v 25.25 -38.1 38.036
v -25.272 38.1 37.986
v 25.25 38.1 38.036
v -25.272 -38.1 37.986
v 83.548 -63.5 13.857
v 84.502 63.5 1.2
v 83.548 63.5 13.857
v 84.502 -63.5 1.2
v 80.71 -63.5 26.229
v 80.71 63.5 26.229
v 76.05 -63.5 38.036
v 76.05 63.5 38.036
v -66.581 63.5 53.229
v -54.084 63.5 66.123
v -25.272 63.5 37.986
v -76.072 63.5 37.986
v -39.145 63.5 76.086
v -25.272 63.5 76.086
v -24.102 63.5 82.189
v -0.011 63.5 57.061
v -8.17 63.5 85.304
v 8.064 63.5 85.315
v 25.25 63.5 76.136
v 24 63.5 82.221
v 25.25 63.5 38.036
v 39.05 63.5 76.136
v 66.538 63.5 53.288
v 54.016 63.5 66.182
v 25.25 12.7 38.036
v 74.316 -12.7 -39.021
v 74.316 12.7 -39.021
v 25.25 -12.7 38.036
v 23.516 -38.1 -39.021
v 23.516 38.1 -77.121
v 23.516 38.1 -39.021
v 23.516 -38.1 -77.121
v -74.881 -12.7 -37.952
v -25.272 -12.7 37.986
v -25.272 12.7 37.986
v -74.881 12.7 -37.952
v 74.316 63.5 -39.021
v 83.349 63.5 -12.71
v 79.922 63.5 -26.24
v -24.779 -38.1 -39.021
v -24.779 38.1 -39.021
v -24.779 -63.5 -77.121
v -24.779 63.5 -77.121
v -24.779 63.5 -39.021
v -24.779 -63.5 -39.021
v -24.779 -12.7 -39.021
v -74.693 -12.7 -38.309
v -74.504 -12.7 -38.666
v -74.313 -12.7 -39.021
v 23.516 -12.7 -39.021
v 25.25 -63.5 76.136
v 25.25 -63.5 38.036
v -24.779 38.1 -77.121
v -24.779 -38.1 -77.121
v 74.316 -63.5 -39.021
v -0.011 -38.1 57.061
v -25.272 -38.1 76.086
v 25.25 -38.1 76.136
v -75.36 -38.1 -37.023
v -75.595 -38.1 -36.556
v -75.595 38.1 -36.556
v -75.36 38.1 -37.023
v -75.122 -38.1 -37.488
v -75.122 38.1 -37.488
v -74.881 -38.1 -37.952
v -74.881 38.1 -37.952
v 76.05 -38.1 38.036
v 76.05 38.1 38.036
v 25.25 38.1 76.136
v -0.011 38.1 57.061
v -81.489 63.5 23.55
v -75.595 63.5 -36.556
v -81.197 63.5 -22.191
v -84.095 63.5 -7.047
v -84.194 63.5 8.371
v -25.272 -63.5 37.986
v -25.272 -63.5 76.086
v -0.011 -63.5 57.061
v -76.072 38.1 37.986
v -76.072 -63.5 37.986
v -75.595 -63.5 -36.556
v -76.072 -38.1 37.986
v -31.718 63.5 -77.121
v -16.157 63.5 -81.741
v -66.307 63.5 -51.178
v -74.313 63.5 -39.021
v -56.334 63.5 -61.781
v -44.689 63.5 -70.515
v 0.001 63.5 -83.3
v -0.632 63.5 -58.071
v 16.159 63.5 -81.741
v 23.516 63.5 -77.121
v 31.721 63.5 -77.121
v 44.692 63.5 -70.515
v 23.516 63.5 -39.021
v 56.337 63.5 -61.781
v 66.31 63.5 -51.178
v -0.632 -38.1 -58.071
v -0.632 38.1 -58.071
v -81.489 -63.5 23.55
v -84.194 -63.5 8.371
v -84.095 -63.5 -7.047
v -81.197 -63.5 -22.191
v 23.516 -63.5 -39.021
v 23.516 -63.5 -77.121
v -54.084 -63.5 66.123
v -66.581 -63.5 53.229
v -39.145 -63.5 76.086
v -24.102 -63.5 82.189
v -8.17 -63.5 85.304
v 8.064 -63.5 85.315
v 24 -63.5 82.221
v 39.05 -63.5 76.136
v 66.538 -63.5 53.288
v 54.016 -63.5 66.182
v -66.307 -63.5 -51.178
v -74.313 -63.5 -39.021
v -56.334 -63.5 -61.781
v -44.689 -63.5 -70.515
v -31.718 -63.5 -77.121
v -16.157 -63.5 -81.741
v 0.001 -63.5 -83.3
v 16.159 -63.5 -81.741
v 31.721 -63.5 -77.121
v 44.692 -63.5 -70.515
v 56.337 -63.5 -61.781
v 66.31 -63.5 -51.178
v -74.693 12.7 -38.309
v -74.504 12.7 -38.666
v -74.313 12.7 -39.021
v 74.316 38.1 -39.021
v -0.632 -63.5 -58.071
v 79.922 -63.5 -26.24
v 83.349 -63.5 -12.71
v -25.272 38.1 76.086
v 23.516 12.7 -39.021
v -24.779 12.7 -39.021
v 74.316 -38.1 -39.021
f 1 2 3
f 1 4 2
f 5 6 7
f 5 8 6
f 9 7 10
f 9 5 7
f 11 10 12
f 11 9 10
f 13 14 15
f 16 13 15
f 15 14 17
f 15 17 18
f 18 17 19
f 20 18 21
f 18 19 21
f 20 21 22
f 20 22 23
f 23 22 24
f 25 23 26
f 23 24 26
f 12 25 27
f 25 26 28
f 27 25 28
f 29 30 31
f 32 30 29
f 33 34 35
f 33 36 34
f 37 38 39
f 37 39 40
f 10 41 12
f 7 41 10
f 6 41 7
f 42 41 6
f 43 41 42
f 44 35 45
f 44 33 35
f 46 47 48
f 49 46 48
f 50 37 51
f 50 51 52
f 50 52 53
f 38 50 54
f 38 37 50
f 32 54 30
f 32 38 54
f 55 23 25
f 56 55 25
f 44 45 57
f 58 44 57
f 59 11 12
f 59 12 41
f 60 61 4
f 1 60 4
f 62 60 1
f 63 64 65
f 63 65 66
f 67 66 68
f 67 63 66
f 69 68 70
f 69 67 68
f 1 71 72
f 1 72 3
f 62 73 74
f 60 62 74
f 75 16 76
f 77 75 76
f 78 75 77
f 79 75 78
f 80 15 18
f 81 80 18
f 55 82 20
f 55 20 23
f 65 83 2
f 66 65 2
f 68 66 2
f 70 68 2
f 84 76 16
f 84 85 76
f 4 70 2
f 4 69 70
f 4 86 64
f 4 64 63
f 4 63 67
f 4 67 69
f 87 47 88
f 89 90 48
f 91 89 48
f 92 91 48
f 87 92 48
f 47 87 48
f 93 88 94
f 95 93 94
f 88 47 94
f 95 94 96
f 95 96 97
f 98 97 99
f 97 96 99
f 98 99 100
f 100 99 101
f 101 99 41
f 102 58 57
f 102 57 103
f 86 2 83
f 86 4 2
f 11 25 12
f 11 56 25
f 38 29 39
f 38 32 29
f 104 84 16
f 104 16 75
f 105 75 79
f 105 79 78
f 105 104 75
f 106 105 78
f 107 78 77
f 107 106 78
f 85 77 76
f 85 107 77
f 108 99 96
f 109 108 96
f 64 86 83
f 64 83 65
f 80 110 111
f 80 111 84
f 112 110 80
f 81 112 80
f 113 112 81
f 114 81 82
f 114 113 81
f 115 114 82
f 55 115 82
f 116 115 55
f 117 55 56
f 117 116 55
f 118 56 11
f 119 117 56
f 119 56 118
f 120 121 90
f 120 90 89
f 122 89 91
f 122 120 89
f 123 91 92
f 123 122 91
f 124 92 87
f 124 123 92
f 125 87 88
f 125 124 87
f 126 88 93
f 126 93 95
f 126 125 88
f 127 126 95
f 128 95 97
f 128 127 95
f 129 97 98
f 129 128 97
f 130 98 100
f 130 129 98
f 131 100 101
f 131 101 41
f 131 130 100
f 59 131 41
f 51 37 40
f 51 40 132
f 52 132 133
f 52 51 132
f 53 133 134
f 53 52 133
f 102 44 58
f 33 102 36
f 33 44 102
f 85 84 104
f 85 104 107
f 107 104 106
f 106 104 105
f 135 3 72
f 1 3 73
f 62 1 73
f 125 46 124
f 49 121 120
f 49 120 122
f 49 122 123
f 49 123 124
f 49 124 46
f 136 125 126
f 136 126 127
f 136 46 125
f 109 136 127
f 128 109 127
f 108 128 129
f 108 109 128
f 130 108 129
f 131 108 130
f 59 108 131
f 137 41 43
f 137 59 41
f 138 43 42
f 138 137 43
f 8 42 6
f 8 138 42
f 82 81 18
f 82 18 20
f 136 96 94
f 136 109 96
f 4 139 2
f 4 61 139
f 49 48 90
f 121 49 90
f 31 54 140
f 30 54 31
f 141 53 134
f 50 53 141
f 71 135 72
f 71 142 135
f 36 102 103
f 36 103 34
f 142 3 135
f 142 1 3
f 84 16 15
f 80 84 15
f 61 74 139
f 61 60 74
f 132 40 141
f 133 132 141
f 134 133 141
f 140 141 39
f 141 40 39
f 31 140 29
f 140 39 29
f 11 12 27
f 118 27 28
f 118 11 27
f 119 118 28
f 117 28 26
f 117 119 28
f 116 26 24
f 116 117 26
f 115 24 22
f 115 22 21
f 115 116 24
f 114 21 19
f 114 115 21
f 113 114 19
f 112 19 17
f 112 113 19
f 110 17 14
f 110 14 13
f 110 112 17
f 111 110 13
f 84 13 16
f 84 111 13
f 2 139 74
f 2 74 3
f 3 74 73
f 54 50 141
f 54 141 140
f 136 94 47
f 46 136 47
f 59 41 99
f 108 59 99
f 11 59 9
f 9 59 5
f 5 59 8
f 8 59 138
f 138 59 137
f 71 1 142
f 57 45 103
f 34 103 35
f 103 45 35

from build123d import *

# Parameters (mm, degrees)
F1_DEPTH = 63.5
F2_DEPTH = 12.7
F3_DEPTH = 38.1


with BuildPart() as f1:
    # F0 (on Front) → F1 (new body, symmetric)
    with BuildSketch(Plane.XZ):
        with BuildLine():
            ThreePointArc((84.5017363775, 1.1998772249), (82.3616896747, 20.0966814365), (76.0499468625, 38.0363278091))
            Line((76.0499468625, 38.0363278091), (74.3155075788, -39.0209970117))
            ThreePointArc((74.3155075788, -39.0209970117), (81.9156048852, -19.5454715399), (84.5017363775, 1.1998772249))
        make_face()
    extrude(amount=F1_DEPTH, both=True)


with BuildPart() as f1b:
    # F0 (on Front) → F1, piece 2 (new body, symmetric)
    with BuildSketch(Plane.XZ):
        with BuildLine():
            ThreePointArc((76.0499468625, 38.0363278091), (60.6212581563, 60.0686808362), (39.0504506642, 76.1363278091))
            Line((39.0504506642, 76.1363278091), (25.2499468625, 76.1363278091))
            Line((25.2499468625, 76.1363278091), (25.2499468625, 38.0363278091))
            Line((25.2499468625, 38.0363278091), (76.0499468625, 38.0363278091))
        make_face()
        with BuildLine():
            Line((25.2499468625, 76.1363278091), (39.0504506642, 76.1363278091))
            ThreePointArc((39.0504506642, 76.1363278091), (-0.0532737034, 85.7001203567), (-39.1445721419, 76.085663861))
            Line((-39.1445721419, 76.085663861), (-25.2715156794, 76.085663861))
            Line((-25.2715156794, 76.085663861), (-0.0107844085, 57.0609958351))
            Line((-0.0107844085, 57.0609958351), (25.2499468625, 76.1363278091))
        make_face()
        with BuildLine():
            Line((-25.2715156794, 76.085663861), (-39.1445721419, 76.085663861))
            ThreePointArc((-39.1445721419, 76.085663861), (-60.6760263163, 60.0091865137), (-76.0715156794, 37.985663861))
            Line((-76.0715156794, 37.985663861), (-25.2715156794, 37.985663861))
            Line((-25.2715156794, 37.985663861), (-25.2715156794, 76.085663861))
        make_face()
    extrude(amount=F1_DEPTH, both=True)


with BuildPart() as f1c:
    # F0 (on Front) → F1, piece 3 (new body, symmetric)
    with BuildSketch(Plane.XZ):
        with BuildLine():
            Line((-75.5949654529, -36.5555488842), (-76.0715156794, 37.985663861))
            ThreePointArc((-76.0715156794, 37.985663861), (-84.4970585704, 0.6596687406), (-75.5949654529, -36.5555488842))
        make_face()
    extrude(amount=F1_DEPTH, both=True)


with BuildPart() as f1d:
    # F0 (on Front) → F1, piece 4 (new body, symmetric)
    with BuildSketch(Plane.XZ):
        with BuildLine():
            Line((-24.7792036653, -77.1209821105), (-24.7792036653, -39.0209821105))
            Line((-24.7792036653, -39.0209821105), (-74.3125646254, -39.0209821105))
            ThreePointArc((-74.3125646254, -39.0209821105), (-56.3340292756, -61.7811118706), (-31.7181884198, -77.1209821105))
            Line((-31.7181884198, -77.1209821105), (-24.7792036653, -77.1209821105))
        make_face()
        with BuildLine():
            ThreePointArc((-31.7181884198, -77.1209821105), (0.001455661, -83.3003836433), (31.7211026448, -77.1209970117))
            Line((31.7211026448, -77.1209970117), (23.5155075788, -77.1209970117))
            Line((23.5155075788, -77.1209970117), (-0.6318480432, -58.0709895611))
            Line((-0.6318480432, -58.0709895611), (-24.7792036653, -77.1209821105))
            Line((-24.7792036653, -77.1209821105), (-31.7181884198, -77.1209821105))
        make_face()
        with BuildLine():
            ThreePointArc((31.7211026448, -77.1209970117), (56.3369591861, -61.7811307512), (74.3155075788, -39.0209970117))
            Line((74.3155075788, -39.0209970117), (23.5155075788, -39.0209970117))
            Line((23.5155075788, -39.0209970117), (23.5155075788, -77.1209970117))
            Line((23.5155075788, -77.1209970117), (31.7211026448, -77.1209970117))
        make_face()
    extrude(amount=F1_DEPTH, both=True)


with BuildPart() as f2:
    # F0 (on Front) → F2 (new body, symmetric)
    with BuildSketch(Plane.XZ):
        Polygon((-0.3362559173, -1.3727754131), (25.2499468625, 38.0363278091), (-25.2715156794, 37.985663861), align=None)
        with BuildLine():
            Line((-24.7792036653, -39.0209821105), (-0.3362559173, -1.3727754131))
            Line((-0.3362559173, -1.3727754131), (-25.2715156794, 37.985663861))
            Line((-25.2715156794, 37.985663861), (-74.8810788251, -37.9523531481))
            ThreePointArc((-74.8810788251, -37.9523531481), (-74.5987352294, -38.48768562), (-74.3125646254, -39.0209821105))
            Line((-74.3125646254, -39.0209821105), (-24.7792036653, -39.0209821105))
        make_face()
        Polygon((74.3155075788, -39.0209970117), (25.2499468625, 38.0363278091), (-0.3362559173, -1.3727754131), (23.5155075788, -39.0209970117), align=None)
        Polygon((23.5155075788, -39.0209970117), (-0.3362559173, -1.3727754131), (-24.7792036653, -39.0209821105), align=None)
    extrude(amount=F2_DEPTH, both=True)


with BuildPart() as f3:
    # F0 (on Front) → F3 (new body, symmetric)
    with BuildSketch(Plane.XZ):
        Polygon((74.3155075788, -39.0209970117), (76.0499468625, 38.0363278091), (25.2499468625, 38.0363278091), align=None)
    extrude(amount=F3_DEPTH, both=True)


with BuildPart() as f3b:
    # F0 (on Front) → F3, piece 2 (new body, symmetric)
    with BuildSketch(Plane.XZ):
        Polygon((-25.2715156794, 37.985663861), (25.2499468625, 38.0363278091), (-0.0107844085, 57.0609958351), align=None)
        Polygon((25.2499468625, 38.0363278091), (25.2499468625, 76.1363278091), (-0.0107844085, 57.0609958351), align=None)
        Polygon((-25.2715156794, 37.985663861), (-0.0107844085, 57.0609958351), (-25.2715156794, 76.085663861), align=None)
    extrude(amount=F3_DEPTH, both=True)


with BuildPart() as f3c:
    # F0 (on Front) → F3, piece 3 (new body, symmetric)
    with BuildSketch(Plane.XZ):
        with BuildLine():
            Line((-25.2715156794, 37.985663861), (-76.0715156794, 37.985663861))
            Line((-76.0715156794, 37.985663861), (-75.5949654529, -36.5555488842))
            ThreePointArc((-75.5949654529, -36.5555488842), (-75.2412634886, -37.2556076234), (-74.8810788251, -37.9523531481))
            Line((-74.8810788251, -37.9523531481), (-25.2715156794, 37.985663861))
        make_face()
    extrude(amount=F3_DEPTH, both=True)


with BuildPart() as f3d:
    # F0 (on Front) → F3, piece 4 (new body, symmetric)
    with BuildSketch(Plane.XZ):
        Polygon((-0.6318480432, -58.0709895611), (-24.7792036653, -39.0209821105), (-24.7792036653, -77.1209821105), align=None)
        Polygon((23.5155075788, -77.1209970117), (23.5155075788, -39.0209970117), (-0.6318480432, -58.0709895611), align=None)
        Polygon((-0.6318480432, -58.0709895611), (23.5155075788, -39.0209970117), (-24.7792036653, -39.0209821105), align=None)
    extrude(amount=F3_DEPTH, both=True)


solid = Compound([f1.part, f1b.part, f1c.part, f1d.part, f2.part, f3.part, f3b.part, f3c.part, f3d.part])
